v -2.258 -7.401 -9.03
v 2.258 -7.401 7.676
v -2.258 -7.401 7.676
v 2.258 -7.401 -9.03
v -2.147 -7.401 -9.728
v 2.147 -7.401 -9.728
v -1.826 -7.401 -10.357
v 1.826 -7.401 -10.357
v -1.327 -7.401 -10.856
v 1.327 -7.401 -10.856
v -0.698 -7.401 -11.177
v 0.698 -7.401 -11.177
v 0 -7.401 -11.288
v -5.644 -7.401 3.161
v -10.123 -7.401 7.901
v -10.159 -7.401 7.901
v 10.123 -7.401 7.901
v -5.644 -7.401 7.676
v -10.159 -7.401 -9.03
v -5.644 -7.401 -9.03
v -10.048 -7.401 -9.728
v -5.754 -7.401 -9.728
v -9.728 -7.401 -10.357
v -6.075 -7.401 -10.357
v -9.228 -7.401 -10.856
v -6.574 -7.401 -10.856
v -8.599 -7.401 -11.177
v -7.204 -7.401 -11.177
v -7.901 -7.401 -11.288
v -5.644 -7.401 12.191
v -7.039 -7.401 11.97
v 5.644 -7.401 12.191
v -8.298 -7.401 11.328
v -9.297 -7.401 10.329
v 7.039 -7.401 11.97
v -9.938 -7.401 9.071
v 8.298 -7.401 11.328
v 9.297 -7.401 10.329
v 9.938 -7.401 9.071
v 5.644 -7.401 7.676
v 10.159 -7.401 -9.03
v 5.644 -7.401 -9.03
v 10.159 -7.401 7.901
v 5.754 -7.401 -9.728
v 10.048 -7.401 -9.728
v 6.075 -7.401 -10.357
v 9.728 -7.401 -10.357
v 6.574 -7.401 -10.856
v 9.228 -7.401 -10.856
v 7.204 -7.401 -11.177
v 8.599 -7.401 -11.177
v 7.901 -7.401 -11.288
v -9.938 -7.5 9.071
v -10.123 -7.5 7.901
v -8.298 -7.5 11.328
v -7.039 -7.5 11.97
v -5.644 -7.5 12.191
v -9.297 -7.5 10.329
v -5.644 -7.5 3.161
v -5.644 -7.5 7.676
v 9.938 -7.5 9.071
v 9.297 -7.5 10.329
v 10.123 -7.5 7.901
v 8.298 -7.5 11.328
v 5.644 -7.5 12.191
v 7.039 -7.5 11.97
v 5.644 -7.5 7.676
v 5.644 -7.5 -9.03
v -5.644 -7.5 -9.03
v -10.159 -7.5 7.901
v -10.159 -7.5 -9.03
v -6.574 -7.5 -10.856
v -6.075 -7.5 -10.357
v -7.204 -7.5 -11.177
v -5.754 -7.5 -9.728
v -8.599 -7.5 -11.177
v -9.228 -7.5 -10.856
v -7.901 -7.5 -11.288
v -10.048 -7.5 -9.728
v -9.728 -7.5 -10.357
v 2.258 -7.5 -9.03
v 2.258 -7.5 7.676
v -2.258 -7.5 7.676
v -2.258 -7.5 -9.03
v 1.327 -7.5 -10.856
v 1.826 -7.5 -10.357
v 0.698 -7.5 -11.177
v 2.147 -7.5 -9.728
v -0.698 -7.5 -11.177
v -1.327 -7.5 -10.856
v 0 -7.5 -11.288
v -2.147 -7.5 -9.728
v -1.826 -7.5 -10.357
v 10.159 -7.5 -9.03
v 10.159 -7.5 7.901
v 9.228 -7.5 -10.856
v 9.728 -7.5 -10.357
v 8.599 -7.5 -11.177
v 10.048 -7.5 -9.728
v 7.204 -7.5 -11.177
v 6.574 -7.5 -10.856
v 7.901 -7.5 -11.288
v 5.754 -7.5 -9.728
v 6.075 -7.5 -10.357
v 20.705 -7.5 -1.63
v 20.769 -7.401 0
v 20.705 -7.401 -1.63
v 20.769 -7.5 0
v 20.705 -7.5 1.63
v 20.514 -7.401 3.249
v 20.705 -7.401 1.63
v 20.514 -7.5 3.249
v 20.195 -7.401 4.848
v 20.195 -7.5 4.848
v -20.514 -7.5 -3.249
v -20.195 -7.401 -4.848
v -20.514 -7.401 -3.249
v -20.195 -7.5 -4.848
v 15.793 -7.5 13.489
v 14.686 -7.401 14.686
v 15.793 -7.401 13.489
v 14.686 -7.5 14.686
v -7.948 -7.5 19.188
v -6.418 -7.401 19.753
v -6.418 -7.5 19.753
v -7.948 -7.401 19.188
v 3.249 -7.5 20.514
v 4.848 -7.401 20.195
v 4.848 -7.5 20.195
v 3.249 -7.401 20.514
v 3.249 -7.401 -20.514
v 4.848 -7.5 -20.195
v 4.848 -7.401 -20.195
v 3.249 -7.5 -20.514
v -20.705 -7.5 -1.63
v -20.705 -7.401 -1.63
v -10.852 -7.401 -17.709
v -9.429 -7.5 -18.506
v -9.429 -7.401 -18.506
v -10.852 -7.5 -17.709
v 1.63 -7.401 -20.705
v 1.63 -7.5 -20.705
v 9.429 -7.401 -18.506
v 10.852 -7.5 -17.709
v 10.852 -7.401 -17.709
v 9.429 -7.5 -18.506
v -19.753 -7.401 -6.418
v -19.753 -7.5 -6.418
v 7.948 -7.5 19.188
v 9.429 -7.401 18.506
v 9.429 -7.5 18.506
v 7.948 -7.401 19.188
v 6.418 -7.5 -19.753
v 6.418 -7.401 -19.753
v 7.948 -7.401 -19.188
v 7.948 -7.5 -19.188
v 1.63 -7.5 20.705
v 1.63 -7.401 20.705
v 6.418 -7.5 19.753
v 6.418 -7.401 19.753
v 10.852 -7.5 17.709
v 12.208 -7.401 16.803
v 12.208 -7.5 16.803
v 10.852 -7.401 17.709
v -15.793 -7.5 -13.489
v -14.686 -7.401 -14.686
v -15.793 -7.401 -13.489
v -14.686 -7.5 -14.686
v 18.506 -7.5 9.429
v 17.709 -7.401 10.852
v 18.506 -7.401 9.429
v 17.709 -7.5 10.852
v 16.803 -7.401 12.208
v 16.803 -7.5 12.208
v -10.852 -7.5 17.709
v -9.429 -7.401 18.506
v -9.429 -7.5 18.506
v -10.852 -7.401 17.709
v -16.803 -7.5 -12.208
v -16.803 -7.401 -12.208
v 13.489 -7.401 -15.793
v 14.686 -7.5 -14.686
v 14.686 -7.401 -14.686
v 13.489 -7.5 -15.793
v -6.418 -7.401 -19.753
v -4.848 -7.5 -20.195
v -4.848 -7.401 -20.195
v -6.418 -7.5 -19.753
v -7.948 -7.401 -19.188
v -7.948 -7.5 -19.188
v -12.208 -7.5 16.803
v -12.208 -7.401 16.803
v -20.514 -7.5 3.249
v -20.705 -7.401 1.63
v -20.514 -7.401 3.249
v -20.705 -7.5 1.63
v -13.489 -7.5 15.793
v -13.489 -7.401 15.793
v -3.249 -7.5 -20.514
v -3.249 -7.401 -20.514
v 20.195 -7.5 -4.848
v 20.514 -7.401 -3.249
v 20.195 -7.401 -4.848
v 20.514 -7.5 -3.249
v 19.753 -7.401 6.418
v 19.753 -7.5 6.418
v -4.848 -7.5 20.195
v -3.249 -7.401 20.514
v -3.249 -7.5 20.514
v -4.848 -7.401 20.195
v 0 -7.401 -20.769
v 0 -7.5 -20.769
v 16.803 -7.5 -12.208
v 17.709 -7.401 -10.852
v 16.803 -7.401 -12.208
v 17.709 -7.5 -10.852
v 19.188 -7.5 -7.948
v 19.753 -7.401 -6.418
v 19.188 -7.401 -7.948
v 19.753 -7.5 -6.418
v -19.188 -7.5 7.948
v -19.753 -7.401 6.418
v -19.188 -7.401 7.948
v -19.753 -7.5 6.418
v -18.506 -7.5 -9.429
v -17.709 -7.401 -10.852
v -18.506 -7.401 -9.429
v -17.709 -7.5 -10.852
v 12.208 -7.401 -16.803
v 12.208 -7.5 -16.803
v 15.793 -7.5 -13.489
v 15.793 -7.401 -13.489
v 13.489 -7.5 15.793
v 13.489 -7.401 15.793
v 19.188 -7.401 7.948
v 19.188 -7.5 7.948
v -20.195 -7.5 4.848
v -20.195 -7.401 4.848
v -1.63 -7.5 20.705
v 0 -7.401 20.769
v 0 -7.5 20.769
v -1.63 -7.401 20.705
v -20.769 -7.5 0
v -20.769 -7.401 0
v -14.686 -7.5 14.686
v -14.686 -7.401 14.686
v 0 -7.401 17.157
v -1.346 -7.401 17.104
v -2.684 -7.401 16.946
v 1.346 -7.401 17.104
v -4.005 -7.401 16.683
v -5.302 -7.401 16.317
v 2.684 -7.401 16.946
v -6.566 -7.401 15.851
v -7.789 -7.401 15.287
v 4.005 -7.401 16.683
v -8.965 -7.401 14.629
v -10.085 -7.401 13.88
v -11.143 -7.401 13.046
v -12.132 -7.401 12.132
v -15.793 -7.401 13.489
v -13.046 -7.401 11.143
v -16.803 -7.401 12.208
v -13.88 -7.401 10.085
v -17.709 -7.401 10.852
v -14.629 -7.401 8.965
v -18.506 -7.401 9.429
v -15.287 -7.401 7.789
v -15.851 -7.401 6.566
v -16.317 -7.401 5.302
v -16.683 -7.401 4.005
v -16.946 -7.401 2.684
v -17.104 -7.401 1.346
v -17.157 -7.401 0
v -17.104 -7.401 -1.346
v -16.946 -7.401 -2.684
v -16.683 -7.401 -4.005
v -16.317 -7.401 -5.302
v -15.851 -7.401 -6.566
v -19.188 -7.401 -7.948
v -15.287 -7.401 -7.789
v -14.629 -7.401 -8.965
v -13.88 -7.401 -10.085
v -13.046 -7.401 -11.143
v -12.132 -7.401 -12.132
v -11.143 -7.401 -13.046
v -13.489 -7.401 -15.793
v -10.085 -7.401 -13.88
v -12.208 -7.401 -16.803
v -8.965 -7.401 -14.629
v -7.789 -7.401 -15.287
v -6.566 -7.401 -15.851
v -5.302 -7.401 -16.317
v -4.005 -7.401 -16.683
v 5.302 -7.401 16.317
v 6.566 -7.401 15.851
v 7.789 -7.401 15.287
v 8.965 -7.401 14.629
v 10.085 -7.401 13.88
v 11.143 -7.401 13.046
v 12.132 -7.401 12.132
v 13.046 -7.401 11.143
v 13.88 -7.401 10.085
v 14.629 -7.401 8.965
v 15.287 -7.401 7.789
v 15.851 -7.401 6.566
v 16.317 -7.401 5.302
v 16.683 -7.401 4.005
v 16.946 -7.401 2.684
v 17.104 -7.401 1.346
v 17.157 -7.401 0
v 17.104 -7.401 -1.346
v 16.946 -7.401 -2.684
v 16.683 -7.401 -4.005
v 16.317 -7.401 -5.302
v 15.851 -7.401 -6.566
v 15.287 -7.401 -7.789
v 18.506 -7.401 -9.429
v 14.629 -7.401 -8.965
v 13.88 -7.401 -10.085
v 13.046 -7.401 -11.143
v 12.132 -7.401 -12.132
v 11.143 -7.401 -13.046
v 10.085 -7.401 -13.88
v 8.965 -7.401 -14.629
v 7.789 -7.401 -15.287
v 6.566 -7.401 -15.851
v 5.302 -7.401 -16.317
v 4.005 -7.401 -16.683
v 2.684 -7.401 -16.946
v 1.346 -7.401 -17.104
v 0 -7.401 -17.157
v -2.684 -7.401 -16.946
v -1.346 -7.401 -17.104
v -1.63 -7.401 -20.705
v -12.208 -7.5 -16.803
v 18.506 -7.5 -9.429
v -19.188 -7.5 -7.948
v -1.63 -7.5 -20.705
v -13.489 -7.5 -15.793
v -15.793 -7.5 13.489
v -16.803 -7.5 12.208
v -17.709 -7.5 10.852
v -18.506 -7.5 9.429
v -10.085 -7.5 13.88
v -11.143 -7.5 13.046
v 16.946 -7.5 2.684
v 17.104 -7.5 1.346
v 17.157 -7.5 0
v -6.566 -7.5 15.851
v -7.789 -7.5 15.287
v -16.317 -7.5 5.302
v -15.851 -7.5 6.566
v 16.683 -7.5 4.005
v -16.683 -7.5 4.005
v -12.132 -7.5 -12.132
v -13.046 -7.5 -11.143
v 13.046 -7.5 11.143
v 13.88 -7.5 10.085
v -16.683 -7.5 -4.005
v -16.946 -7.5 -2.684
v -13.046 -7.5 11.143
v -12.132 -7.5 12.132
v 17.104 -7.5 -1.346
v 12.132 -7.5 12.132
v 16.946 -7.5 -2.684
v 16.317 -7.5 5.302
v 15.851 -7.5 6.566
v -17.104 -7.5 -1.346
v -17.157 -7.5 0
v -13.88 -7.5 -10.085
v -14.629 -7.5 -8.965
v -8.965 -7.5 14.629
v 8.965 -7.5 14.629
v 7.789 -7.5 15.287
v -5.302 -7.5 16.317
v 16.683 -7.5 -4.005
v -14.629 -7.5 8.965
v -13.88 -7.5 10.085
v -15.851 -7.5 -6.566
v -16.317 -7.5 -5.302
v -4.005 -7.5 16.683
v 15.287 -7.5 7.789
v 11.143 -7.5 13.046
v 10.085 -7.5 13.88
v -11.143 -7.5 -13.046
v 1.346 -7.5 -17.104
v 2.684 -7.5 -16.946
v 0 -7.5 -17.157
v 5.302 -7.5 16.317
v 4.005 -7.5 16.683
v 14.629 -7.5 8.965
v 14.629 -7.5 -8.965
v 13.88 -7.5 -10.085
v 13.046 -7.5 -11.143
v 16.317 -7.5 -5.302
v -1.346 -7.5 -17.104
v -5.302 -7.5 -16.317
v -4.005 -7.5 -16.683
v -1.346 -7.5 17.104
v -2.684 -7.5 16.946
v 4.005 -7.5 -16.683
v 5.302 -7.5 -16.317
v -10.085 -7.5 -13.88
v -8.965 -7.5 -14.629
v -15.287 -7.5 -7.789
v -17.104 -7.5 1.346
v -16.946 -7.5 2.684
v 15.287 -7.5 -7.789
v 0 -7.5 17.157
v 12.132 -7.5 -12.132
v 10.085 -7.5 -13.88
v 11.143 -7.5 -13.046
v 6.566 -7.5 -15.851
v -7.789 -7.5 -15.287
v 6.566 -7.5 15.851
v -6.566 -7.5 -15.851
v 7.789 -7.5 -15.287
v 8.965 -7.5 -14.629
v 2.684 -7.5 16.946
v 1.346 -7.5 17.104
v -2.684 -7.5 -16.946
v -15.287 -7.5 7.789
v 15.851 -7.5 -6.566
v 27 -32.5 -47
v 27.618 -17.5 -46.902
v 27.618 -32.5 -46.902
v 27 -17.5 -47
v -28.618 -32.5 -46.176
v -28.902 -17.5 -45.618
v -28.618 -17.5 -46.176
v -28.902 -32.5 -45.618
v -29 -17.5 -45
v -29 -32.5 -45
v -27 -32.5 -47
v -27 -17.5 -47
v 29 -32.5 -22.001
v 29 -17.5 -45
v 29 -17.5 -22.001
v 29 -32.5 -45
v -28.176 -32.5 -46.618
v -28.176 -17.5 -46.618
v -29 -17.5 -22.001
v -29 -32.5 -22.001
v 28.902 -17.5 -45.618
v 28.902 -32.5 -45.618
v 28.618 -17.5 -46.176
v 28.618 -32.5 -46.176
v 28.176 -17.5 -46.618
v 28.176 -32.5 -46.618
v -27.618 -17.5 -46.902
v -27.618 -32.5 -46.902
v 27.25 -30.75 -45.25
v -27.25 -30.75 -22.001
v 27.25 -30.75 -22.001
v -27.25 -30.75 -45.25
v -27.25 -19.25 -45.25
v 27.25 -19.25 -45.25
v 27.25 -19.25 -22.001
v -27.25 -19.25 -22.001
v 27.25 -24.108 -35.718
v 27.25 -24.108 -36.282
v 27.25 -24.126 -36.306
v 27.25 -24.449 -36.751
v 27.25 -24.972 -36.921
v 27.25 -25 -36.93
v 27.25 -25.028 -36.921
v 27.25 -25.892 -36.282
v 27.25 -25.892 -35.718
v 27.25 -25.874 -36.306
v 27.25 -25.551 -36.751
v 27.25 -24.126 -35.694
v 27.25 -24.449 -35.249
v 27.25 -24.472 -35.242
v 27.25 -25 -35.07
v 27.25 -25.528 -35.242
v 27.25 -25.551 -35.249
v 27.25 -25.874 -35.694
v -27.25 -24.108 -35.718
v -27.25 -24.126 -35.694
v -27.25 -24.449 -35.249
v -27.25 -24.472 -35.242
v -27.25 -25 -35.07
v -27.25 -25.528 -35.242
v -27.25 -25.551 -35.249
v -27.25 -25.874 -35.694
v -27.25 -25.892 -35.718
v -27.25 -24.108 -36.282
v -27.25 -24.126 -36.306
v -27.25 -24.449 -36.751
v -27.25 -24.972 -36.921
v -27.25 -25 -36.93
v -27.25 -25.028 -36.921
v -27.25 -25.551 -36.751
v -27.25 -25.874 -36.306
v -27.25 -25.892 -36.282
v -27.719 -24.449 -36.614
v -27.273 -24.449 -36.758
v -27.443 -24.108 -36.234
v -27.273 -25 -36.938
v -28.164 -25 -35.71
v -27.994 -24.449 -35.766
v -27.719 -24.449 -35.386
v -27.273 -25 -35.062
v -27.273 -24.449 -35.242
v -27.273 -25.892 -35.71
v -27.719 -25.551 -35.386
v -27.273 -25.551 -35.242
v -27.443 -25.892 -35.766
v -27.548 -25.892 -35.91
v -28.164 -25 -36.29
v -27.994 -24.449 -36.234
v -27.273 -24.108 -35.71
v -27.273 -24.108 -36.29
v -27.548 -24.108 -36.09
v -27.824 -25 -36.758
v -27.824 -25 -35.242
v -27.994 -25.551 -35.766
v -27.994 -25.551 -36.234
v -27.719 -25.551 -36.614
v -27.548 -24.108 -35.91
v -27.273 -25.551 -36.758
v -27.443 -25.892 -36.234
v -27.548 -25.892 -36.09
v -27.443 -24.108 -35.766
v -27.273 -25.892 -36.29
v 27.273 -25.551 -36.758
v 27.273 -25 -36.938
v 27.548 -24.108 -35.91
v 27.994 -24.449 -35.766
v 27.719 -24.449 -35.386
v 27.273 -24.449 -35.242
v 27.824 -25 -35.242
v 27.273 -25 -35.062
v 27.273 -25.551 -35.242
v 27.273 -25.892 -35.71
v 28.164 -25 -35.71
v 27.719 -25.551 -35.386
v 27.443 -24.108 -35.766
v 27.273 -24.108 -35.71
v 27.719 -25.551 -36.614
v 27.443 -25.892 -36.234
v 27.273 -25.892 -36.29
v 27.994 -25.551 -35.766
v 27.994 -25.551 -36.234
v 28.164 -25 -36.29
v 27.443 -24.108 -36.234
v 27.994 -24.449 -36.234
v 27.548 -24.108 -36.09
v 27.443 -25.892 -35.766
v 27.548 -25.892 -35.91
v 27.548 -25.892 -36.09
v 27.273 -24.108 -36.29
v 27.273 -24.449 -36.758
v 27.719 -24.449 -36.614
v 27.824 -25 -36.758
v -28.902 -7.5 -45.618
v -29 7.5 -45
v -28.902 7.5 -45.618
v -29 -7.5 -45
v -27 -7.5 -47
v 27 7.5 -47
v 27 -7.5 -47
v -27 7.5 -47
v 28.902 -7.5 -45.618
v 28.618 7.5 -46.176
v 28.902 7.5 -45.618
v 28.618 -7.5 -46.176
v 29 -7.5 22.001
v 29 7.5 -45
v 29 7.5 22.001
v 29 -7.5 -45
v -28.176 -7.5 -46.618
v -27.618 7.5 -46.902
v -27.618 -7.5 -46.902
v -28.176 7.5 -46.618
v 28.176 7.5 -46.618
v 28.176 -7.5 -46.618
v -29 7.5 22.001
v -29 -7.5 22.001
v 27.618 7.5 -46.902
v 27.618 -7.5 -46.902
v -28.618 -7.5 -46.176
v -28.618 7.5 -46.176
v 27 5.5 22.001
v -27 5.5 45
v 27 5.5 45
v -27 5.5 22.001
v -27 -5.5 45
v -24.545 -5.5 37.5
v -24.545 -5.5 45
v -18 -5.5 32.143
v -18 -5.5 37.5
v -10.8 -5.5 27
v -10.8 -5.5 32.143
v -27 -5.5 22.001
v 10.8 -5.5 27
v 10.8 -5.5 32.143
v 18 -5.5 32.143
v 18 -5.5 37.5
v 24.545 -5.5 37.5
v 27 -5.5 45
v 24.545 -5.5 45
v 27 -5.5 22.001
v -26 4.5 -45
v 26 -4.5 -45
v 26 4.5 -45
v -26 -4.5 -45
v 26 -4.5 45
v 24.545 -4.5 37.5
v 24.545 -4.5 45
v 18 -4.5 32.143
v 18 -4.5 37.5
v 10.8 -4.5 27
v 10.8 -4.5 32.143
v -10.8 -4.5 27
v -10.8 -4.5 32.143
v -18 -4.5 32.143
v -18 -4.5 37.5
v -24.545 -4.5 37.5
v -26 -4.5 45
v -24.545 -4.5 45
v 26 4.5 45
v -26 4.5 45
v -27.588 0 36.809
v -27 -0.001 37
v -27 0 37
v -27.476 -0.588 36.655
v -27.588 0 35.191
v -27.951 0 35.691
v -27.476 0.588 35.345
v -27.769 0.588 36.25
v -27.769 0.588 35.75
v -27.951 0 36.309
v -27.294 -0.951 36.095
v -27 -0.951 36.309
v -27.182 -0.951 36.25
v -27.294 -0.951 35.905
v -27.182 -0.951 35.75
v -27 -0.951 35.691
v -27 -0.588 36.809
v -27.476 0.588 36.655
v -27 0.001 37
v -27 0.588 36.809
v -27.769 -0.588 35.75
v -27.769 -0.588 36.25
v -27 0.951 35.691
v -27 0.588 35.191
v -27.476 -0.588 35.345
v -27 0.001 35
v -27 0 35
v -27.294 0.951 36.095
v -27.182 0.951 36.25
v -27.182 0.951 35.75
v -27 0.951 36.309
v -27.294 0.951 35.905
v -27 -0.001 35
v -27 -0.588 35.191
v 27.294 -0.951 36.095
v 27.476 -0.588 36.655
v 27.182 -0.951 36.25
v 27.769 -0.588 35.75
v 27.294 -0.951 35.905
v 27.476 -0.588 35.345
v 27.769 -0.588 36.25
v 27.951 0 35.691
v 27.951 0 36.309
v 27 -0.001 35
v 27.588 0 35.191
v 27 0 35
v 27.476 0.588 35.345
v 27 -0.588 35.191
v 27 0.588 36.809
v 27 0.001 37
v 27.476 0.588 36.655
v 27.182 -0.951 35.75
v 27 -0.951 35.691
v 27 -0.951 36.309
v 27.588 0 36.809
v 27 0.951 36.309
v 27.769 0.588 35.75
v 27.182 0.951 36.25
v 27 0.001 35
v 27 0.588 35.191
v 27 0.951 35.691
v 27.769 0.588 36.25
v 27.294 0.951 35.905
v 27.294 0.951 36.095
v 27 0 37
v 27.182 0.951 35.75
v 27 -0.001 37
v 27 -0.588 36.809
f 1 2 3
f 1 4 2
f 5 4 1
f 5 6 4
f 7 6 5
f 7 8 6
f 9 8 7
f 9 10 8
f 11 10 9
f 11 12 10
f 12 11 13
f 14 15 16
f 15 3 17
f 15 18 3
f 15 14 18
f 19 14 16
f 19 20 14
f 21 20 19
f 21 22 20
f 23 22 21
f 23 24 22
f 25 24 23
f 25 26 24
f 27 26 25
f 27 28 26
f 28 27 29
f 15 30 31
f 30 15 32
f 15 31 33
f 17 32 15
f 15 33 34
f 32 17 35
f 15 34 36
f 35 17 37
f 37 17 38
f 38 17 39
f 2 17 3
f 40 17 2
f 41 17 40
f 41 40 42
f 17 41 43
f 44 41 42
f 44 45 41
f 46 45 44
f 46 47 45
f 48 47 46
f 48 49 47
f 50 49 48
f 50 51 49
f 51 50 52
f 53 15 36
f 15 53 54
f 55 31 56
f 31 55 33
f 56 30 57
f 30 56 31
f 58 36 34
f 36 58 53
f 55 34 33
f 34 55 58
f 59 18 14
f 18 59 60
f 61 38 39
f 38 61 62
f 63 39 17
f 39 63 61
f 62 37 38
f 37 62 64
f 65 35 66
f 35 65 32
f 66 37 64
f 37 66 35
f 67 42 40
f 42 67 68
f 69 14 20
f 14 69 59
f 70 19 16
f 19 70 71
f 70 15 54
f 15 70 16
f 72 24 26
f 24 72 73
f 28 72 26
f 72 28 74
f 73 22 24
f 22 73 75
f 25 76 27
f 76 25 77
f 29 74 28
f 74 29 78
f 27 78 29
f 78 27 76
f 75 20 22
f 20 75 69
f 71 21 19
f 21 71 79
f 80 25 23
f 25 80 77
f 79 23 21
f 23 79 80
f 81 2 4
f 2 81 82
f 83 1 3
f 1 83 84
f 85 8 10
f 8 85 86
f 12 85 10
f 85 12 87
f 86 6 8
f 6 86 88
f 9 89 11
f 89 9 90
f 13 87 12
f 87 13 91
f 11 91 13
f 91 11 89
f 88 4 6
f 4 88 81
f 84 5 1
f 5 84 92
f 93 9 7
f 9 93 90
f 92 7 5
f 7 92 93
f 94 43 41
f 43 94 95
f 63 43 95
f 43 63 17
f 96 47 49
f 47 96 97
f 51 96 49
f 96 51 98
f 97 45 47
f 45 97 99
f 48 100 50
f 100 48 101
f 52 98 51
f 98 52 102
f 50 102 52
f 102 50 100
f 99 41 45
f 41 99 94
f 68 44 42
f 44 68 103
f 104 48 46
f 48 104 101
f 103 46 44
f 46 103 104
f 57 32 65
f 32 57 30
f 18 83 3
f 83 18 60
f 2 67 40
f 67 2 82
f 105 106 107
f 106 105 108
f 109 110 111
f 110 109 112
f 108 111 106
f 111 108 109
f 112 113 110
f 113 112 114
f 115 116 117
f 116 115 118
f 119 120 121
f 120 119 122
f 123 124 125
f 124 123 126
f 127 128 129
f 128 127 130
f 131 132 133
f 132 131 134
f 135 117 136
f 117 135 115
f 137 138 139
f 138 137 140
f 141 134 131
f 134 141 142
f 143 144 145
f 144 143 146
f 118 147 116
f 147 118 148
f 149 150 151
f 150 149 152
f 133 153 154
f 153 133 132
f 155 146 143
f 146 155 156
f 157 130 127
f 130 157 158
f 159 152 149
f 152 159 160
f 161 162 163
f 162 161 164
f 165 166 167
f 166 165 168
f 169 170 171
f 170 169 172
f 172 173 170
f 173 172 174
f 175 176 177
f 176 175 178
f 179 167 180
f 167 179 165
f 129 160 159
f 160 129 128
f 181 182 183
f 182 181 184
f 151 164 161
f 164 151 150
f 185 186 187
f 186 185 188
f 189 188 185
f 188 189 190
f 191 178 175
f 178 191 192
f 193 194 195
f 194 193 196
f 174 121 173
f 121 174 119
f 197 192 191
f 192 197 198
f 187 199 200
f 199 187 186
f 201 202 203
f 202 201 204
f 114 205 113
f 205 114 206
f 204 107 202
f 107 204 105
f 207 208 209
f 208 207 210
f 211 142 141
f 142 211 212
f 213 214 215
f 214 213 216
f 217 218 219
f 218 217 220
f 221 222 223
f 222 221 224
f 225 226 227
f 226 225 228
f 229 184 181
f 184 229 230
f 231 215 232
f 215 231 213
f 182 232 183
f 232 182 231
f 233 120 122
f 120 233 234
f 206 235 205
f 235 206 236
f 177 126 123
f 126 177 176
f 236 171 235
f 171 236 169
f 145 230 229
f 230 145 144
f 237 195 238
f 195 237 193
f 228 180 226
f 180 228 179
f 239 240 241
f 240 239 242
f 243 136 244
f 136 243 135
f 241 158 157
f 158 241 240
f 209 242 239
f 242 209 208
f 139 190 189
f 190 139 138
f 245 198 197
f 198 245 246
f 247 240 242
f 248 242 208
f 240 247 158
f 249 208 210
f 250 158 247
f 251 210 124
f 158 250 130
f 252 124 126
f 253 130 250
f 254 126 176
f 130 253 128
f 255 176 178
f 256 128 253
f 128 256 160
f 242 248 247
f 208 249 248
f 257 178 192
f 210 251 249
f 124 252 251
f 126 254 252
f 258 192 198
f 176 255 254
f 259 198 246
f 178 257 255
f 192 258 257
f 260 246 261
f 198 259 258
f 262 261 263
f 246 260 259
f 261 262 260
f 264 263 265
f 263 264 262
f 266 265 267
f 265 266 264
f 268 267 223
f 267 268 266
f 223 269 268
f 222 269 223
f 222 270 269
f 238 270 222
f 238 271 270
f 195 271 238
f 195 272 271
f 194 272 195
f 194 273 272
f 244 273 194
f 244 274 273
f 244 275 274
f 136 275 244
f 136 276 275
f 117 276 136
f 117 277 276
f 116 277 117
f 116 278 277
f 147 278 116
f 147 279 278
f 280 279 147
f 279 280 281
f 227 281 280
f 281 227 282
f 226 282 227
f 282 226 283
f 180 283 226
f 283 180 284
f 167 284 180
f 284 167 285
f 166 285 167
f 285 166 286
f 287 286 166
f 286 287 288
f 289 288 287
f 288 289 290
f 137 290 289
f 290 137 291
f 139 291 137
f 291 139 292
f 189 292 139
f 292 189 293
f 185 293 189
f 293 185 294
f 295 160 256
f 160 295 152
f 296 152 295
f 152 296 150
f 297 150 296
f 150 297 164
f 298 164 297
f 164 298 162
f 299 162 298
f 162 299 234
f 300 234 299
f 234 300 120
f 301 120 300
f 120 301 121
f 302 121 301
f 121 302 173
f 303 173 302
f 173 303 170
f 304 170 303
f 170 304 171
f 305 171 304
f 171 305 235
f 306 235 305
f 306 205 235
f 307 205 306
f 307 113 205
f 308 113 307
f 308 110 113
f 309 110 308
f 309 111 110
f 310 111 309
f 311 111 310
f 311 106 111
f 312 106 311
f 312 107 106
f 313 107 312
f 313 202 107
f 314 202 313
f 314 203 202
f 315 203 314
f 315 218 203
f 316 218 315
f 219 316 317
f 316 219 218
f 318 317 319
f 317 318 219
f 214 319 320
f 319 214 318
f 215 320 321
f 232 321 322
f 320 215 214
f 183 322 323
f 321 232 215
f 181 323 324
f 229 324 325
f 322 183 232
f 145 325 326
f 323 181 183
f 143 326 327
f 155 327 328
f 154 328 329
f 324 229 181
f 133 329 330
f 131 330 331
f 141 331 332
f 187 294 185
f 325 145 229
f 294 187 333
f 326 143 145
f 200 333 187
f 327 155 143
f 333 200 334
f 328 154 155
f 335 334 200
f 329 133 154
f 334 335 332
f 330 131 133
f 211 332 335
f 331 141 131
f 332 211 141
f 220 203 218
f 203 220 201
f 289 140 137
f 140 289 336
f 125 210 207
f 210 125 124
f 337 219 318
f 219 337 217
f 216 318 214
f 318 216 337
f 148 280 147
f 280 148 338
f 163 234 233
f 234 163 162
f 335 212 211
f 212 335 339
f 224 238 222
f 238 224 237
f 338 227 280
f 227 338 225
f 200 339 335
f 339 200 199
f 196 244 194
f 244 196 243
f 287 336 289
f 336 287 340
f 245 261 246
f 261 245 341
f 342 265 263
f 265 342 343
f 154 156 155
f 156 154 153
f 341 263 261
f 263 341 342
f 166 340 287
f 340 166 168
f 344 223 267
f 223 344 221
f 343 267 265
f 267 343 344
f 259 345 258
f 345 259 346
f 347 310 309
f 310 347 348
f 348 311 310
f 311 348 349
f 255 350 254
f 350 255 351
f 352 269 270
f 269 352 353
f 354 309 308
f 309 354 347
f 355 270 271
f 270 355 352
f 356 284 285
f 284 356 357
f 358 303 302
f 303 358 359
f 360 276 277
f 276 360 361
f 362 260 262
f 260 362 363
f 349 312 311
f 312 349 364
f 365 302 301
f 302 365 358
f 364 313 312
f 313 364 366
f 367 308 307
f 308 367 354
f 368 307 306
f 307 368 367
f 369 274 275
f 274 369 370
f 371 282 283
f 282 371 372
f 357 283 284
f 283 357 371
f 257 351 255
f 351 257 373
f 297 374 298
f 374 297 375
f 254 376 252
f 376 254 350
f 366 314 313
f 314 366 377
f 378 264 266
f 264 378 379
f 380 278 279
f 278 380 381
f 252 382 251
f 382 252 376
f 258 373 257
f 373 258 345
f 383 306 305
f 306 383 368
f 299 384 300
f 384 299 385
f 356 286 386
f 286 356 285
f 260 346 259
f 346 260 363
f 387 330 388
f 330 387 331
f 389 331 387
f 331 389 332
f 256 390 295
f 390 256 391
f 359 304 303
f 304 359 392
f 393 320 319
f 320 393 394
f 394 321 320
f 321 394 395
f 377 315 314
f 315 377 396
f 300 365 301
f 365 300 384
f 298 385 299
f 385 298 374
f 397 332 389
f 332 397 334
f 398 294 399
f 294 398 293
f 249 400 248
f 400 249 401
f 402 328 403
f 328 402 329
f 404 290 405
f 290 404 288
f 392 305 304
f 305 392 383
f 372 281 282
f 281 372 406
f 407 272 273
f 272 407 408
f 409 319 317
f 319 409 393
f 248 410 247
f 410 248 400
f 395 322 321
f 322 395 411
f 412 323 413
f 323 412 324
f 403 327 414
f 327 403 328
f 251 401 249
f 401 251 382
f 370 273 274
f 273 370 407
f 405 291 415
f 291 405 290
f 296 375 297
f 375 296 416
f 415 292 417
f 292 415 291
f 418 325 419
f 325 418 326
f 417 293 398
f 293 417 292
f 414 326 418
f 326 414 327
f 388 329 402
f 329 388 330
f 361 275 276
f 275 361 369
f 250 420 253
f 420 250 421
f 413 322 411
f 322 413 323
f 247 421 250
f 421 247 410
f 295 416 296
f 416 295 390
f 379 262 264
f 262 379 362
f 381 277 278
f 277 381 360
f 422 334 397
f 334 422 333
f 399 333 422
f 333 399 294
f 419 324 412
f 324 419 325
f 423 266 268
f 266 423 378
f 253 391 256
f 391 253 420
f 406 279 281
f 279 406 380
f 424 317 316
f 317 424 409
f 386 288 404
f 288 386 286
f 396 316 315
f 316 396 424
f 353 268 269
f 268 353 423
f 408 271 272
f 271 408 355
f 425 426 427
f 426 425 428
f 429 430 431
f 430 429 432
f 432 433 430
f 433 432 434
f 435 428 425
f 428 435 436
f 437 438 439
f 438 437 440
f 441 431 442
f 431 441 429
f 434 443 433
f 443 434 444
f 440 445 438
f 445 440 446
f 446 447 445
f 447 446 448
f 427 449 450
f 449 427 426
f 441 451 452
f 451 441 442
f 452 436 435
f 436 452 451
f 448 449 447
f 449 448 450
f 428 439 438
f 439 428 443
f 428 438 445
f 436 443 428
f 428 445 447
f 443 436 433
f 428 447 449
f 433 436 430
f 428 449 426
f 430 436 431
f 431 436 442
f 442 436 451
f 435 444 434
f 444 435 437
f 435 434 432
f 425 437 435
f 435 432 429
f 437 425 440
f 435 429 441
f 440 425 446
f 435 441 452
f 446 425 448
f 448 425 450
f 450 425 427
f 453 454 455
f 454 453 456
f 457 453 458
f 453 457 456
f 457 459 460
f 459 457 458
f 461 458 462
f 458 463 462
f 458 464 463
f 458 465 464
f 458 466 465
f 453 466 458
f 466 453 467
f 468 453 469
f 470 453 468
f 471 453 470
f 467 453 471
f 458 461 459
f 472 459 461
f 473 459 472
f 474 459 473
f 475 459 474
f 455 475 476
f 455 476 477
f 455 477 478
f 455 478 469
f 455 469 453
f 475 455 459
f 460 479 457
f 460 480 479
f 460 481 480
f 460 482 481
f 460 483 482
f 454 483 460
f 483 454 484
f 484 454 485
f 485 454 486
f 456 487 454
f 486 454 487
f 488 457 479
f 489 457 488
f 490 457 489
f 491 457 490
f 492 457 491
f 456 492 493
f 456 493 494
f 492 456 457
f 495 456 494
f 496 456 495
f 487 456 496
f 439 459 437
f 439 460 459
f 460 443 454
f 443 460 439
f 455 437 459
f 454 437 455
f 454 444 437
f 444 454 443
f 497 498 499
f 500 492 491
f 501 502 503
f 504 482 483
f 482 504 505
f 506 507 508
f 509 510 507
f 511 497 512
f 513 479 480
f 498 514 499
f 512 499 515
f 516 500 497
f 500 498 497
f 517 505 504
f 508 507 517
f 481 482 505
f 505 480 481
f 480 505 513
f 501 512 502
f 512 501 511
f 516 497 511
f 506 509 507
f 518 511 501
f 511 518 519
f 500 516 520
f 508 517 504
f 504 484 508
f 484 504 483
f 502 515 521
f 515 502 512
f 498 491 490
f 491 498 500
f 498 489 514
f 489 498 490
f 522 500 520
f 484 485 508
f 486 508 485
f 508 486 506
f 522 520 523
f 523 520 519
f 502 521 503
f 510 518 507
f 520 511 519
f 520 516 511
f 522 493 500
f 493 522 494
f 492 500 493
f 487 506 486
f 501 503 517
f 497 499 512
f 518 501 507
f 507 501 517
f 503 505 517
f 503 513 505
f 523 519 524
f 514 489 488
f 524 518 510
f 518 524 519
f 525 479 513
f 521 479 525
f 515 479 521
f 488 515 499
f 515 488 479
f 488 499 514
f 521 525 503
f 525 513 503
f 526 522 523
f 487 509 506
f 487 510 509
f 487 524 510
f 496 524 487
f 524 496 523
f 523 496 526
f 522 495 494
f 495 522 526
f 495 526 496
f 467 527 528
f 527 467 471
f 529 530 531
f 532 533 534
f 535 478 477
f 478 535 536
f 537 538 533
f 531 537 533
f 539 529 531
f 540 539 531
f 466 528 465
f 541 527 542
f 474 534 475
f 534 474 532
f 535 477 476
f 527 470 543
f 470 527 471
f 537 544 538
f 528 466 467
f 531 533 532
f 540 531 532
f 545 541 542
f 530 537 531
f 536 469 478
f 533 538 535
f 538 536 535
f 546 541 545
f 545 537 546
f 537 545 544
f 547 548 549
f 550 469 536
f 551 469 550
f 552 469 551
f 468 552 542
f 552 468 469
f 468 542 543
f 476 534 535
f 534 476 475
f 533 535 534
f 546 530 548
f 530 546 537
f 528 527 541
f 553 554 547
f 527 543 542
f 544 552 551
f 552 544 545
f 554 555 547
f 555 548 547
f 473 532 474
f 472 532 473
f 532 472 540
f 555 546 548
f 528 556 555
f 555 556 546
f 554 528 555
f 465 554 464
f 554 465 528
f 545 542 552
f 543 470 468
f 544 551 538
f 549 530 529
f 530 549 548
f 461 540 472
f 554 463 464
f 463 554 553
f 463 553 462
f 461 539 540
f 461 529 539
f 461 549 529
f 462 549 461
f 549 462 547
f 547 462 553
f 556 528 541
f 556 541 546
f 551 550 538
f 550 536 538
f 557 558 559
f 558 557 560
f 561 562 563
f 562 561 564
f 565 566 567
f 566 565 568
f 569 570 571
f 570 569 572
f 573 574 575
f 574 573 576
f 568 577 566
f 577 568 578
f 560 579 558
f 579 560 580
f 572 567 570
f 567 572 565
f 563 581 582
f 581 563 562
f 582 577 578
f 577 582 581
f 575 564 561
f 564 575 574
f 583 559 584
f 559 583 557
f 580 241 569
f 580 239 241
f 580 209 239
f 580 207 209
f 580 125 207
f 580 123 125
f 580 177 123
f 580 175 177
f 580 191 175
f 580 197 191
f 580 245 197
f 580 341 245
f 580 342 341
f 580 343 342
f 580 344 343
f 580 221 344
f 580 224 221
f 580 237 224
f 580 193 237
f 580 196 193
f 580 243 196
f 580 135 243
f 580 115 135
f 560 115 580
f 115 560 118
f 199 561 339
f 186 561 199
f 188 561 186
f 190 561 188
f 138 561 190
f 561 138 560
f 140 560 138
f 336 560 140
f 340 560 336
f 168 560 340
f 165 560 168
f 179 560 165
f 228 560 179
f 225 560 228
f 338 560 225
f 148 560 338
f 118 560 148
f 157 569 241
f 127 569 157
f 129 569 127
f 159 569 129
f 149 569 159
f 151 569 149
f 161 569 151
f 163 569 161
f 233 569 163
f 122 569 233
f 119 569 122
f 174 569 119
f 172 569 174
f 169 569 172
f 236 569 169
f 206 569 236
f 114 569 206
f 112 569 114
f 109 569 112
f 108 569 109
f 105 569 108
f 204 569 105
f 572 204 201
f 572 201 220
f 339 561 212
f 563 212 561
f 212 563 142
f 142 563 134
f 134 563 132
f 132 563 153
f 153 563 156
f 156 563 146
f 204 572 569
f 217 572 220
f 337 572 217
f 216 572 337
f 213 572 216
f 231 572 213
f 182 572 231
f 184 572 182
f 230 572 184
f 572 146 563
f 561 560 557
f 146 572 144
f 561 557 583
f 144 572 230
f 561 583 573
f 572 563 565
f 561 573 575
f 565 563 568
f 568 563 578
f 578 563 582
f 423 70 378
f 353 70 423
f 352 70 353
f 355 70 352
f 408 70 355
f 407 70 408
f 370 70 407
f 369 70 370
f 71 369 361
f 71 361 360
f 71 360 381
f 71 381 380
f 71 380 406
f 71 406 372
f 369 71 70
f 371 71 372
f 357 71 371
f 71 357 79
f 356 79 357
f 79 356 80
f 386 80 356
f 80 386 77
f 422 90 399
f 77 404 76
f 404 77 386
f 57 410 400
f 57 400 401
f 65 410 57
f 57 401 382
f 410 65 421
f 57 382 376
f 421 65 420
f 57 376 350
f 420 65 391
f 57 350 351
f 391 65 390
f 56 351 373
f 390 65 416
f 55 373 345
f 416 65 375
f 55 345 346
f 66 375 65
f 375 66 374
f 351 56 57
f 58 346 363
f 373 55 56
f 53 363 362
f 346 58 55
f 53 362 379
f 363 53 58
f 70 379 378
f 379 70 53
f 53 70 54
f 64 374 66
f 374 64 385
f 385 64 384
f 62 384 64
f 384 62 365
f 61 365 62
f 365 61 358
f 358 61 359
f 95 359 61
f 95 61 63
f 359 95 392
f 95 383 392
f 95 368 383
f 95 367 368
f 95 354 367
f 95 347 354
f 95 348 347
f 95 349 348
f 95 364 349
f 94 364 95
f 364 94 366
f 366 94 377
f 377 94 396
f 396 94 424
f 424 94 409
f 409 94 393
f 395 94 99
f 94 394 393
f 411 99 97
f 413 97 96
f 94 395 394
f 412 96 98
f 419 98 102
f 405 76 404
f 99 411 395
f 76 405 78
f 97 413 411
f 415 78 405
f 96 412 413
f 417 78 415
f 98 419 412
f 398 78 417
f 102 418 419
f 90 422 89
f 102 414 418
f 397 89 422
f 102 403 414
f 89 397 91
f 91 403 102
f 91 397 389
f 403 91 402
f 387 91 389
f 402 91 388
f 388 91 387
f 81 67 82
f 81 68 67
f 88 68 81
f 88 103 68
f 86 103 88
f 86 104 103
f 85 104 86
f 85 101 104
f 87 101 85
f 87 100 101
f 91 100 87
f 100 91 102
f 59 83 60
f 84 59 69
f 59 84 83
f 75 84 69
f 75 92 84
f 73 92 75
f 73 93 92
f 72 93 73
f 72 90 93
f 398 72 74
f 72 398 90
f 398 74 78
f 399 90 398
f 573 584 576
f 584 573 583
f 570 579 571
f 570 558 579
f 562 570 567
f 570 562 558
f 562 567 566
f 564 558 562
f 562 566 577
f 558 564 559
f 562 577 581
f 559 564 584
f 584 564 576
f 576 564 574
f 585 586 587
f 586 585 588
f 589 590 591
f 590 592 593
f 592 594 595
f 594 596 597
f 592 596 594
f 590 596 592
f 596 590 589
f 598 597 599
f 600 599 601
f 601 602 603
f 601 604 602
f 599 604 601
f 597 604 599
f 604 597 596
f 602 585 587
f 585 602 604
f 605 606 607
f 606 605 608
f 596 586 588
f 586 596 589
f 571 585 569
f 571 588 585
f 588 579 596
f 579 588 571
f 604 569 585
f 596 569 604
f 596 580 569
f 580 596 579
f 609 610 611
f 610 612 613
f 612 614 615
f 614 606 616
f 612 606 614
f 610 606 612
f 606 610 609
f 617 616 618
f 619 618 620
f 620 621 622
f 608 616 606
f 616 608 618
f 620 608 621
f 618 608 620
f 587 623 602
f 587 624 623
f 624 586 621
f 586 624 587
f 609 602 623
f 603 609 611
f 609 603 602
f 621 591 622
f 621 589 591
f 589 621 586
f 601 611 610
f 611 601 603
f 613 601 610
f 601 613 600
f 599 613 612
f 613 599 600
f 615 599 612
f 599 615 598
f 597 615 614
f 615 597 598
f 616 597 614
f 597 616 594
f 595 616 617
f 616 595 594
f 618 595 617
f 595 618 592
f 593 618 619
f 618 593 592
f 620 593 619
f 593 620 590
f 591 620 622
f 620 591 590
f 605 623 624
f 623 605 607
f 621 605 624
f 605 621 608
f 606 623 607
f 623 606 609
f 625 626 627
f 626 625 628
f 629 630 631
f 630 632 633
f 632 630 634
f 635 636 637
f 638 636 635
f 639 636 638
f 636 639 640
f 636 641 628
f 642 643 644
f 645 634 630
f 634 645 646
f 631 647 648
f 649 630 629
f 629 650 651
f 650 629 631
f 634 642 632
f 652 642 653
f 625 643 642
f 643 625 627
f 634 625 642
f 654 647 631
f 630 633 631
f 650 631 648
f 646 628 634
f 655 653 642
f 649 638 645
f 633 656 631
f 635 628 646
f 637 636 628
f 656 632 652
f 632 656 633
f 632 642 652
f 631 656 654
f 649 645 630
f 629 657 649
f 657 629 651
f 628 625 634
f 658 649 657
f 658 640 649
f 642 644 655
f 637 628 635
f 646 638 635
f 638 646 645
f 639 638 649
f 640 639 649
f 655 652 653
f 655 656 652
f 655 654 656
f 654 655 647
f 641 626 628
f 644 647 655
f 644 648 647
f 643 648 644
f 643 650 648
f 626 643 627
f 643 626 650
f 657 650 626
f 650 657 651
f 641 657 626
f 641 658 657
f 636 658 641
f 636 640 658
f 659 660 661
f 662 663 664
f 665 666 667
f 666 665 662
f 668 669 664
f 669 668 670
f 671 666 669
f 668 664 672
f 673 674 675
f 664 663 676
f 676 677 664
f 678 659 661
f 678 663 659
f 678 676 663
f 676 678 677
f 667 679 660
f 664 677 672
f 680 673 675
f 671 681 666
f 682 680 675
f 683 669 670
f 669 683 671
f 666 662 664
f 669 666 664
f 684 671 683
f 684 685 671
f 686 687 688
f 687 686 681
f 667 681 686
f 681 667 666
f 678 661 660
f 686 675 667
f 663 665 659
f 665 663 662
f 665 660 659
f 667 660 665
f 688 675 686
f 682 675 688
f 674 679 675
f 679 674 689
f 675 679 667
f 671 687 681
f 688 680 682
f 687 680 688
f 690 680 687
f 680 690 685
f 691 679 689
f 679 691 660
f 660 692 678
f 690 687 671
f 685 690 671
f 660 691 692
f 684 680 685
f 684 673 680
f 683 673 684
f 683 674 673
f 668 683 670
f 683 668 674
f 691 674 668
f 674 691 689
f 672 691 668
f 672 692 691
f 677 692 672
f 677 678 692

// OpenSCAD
/* [Global] */

/* [Card] */
//How many cards would you like to hold?
card_number = 15;
//How long is your card?
card_length = 89.22;
//How wide is your card?
card_width = 51.1;
//How thick is your card?
card_thickness = .5;

/* [Box] */
wall_thickness = 2; //[2:1:10]
corner_style = "Rounded"; //[Rounded,Angled,None]

/* [Logo] */
logo_style = "MakerBot Logo"; //[MakerBot Logo,Heart,Star,Draw Your Own,None]
logo_size = 20; //[1:1:50]
logo_depth = .1; //[.1:.1:1]

/* [Star] */
//This will only affect the "Star" logo style.
star_border_thickness = 15; //[0:1:50]

/* [Draw] */
//Draw your own logo using the canvas below. WARNING: This feature is experimental, and may be a big buggy!
draw_a_logo =  [[[-30.607849,-48.473831],[-38.714745,-48.950043],[-40.559818,-48.486679],[-42.201851,-47.493645],[-47.306175,-42.282654],[-50.067959,-38.508476],[-47.496841,-39.749046],[-46.892071,-39.806171],[-46.653542,-39.556297],[-49.260830,-36.213120],[-49.681732,-34.902710],[-49.585598,-33.782043],[-49.138451,-33.165283],[-48.672112,-33.207165],[-46.200596,-35.658916],[-47.279457,-33.120216],[-47.321926,-32.230251],[-46.990898,-31.375122],[-45.878410,-30.094749],[-43.224831,-28.013985],[-42.217957,-27.615326],[-41.118553,-27.667067],[-40.805717,-27.398746],[-40.440659,-25.661360],[-39.173859,-13.378041],[-37.786060,-6.545761],[-36.585690,-3.203835],[-34.921036,-0.177278],[-32.697136,2.334522],[-31.352158,3.341671],[-28.276741,4.879042],[-24.862782,5.878342],[-21.320715,6.457005],[-16.227745,6.793123],[-6.193724,6.651176],[-3.917368,6.182596],[1.149520,4.628635],[3.496422,4.354591],[5.367534,4.861082],[8.187830,6.665401],[10.588829,7.390333],[11.411912,7.954811],[11.835903,9.095350],[12.399237,12.947439],[13.889902,16.162262],[13.933737,17.683546],[13.316607,19.065596],[11.898010,21.208532],[6.859921,27.302176],[5.617778,29.462534],[5.115950,31.361303],[3.388903,42.964180],[3.273381,46.066513],[3.726890,48.114418],[4.978456,49.315399],[7.242655,49.967201],[8.609360,50.079552],[9.707384,49.859634],[11.739238,48.611275],[14.175842,46.044868],[16.663437,42.226387],[17.125431,47.022690],[17.457367,48.010414],[17.989151,48.348061],[19.181324,47.905319],[24.528868,44.299988],[25.586594,43.349907],[26.602041,41.795021],[27.508392,39.332878],[29.795576,26.542974],[30.282230,24.476656],[31.117352,22.414083],[31.720629,21.625368],[32.642006,21.057058],[35.131134,20.683912],[36.914520,20.059973],[39.043831,18.184668],[42.450657,14.071085],[46.617176,8.405781],[48.564854,5.175398],[49.817593,2.084951],[50.067959,0.425432],[49.656380,-0.983798],[48.150597,-2.837172],[45.817619,-4.786176],[42.303886,-6.914544],[36.506889,-8.046309],[35.342590,-8.523187],[34.626579,-9.248261],[34.336266,-10.490269],[34.565552,-12.031119],[35.052368,-13.404231],[37.089733,-17.042198],[37.317879,-18.115067],[37.155357,-19.071182],[35.604301,-21.320902],[33.913990,-23.043991],[33.883816,-28.314064],[33.082306,-30.108660],[31.550901,-32.176041],[30.204401,-33.504837],[26.342428,-35.397213],[25.570063,-36.226906],[25.784672,-37.377975],[26.657942,-38.691196],[35.016315,-47.244415],[36.307613,-48.865204],[36.517559,-49.673759],[35.642605,-50.079552],[30.526541,-50.070801],[27.432796,-49.786285],[24.770382,-49.194931],[21.059244,-47.649162],[13.547039,-43.090836],[12.276370,-42.541962],[10.688703,-42.258522],[3.786492,-43.914528],[2.470330,-44.603432],[2.196272,-45.124454],[2.270218,-46.117500],[3.513528,-49.225983],[3.376098,-49.617065],[2.794866,-49.836327],[-5.766325,-50.020004],[-18.879635,-49.768524],[-25.214447,-49.130280],[-29.151905,-47.714996],[-30.600498,-48.472359]],[[0,1,2,3,4,5,6,7,8,9,10,11,12,13,14,15,16,17,18,19,20,21,22,23,24,25,26,27,28,29,30,31,32,33,34,35,36,37,38,39,40,41,42,43,44,45,46,47,48,49,50,51,52,53,54,55,56,57,58,59,60,61,62,63,64,65,66,67,68,69,70,71,72,73,74,75,76,77,78,79,80,81,82,83,84,85,86,87,88,89,90,91,92,93,94,95,96,97,98,99,100,101,102,103,104,105,106,107,108,109,110,111,112,113,114,115,116,117,118,119,120,121,122,123,124,125,126,127]]]; //[draw_polygon:100x100]

/* [Hidden] */

//The thickness of the border around the inside of the box which locks into the top piece.
border_thickness = wall_thickness/2; //[1:1:5]


/* [Upload] */ //IF YOU PUT THIS BACK IN, REMEMBER TO ADD IT TO LOGO_STYLE
// Upload a 100x100 pixel image (images will be automatically stretched to fit). Simple, high contrast images like logos work best.
//upload_image = "testimage_invert.dat"; // [image_surface:100x100]

inner_length = ceil(card_length); //Card is 89.22mm
inner_width = ceil(card_width) + (border_thickness * 2); //Card is 51.10mm
inner_height = ((card_thickness * 1.2) * card_number) + (border_thickness * 2); //Card is .5mm
frontcut1_length = inner_length / 6;
frontcut1_width = inner_width / 1.1;
frontcut2_length = inner_length / 3.5;
frontcut2_width = inner_width / 1.5;
frontcut3_length = inner_length / 2.5;
frontcut3_width = inner_width / 2.5;
top_height = (inner_length + wall_thickness) / 4;
top_fit = 4;
logo_xy = logo_size * (inner_width / 26);
MBM_height = 60;
MBM_thickness = 1;
MBM_radius = MBM_height/5.5;
function lookup_rez(wall_thickness) = floor(lookup(wall_thickness,[[2,10],[10,20]]));
e = .001; //epsilon

rotate([90,90,0]){
    TopFinal();
    BottomFinal();
}

/* Modules */

module TopFinal(){
    translate([0,0,(inner_height + (wall_thickness * 2)) + 10]){
        rotate([0,180,0]){
            difference(){
                TopLocked();
                translate([0,0,((inner_height/2) + wall_thickness + (wall_thickness/4)) - logo_depth + e]){
                    if(logo_style == "MakerBot Logo"){
                        MakerbotLogo();
                    }
                    if(logo_style == "Heart"){
                        HeartLogo();
                    }
                    if(logo_style == "Star"){
                        StarLogo();
                    }
                    if(logo_style == "Upload An Image"){
                        UploadedLogo();
                    }
                    if(logo_style == "Draw Your Own"){
                        DrawnLogo();
                    }
                }
            }
        }
    }
}
module BottomFinal(){
    difference(){
        BottomLocked();
        translate([0,0,((inner_height/2) + wall_thickness + (wall_thickness/4)) - logo_depth + e]){
            if(logo_style == "MakerBot Logo"){
                MakerbotLogo();
            }
            if(logo_style == "Heart"){
                HeartLogo();
            }
            if(logo_style == "Star"){
                StarLogo();
            }
            if(logo_style == "Upload An Image"){
                UploadedLogo();
            }
            if(logo_style == "Draw Your Own"){
                DrawnLogo();
            }
        }
    }
}
module HeartLogo(){
    resize([logo_xy,logo_xy,wall_thickness/2]){
        translate([1.5,0,0]){
            rotate([0,0,135]){
                linear_extrude(height = 1, center = true){
                    square([20,20], center = true);
                    translate([0, 10, 0]){
                        circle(r = 10);
                    }
                    translate([10, 0, 0]){
                        circle(r = 10);
                    }
                }
            }
        }
    }
}
module DrawnLogo(){
    scale([logo_xy/100,logo_xy/100,wall_thickness/2]){
        rotate([0,0,90]){
            linear_extrude(height = 1, center = true){
                polygon(points = draw_a_logo[0], paths = draw_a_logo[1], center = true);
            }
        }
    }
}
//module UploadedLogo(){
//    resize([logo_xy,logo_xy,wall_thickness/2]){
//        translate([0,0,-.25]){
//            difference(){
//                surface(file = upload_image, center = true);
//                translate([0,0,-.5]){
//                    cube([100,100,1],center = true);
//                }
//            }
//        }
//    }
//}
module StarLogo(){
    resize([logo_xy,logo_xy,wall_thickness/2]){
        difference(){
            cylinder($fn = 3, r = 50, h = 1, center = true);
            cylinder($fn = 3, r = 50 - star_border_thickness, h = 1, center = true);
        }
        rotate([0,0,180]){
            difference(){
                cylinder($fn = 3, r = 50, h = 1, center = true);
                cylinder($fn = 3, r = 50 - star_border_thickness, h = 1, center = true);
            }
        }
    }
}
module MakerbotLogo(){
	resize([logo_xy,logo_xy,wall_thickness/2]){
        rotate([0,0,90]){
            translate([-1.25*MBM_radius,1.5*MBM_radius,-MBM_thickness/2]){
                translate([0,MBM_radius * 0.2,]){
                    difference(){
                        cylinder(r=MBM_radius,h = MBM_thickness, $fn=20);
                        translate([0,-1*MBM_radius,0]){
                            cube([MBM_radius,MBM_radius,MBM_thickness]);
                        }
                    }
                }
                translate([2.5*MBM_radius,MBM_radius * 0.2,0]){
                    difference(){
                        cylinder(r=MBM_radius,h = MBM_thickness, $fn=20);
                        translate([-1*MBM_radius,-1*MBM_radius,0]){
                            cube([MBM_radius,MBM_radius,MBM_thickness]);
                        }
                    }
                }
                translate([-1*MBM_radius,0,0]){
                    translate([0,-3.5*MBM_radius,0]){
                        cube([MBM_radius,3.75*MBM_radius,MBM_thickness]);
                    }
                    translate([MBM_radius/2,-3.5*MBM_radius,0]){
                        cylinder(r=MBM_radius/2,h=MBM_thickness, $fn=20);
                    }
                }
                translate([0.75*MBM_radius,0,0]){
                    translate([0,-3.5*MBM_radius,0]){
                        cube([MBM_radius,3.75*MBM_radius,MBM_thickness]);
                    }
                    translate([MBM_radius/2,-3.5*MBM_radius,0]){
                        cylinder(r=MBM_radius/2,h=MBM_thickness, $fn=20);
                    }
                }
                translate([2.5*MBM_radius,0,0]){
                    translate([0,-3.5*MBM_radius,0]){
                        cube([MBM_radius,3.75*MBM_radius,MBM_thickness]);
                    }
                    translate([MBM_radius/2,-3.5*MBM_radius,0]){
                        cylinder(r=MBM_radius/2,h=MBM_thickness, $fn=20);
                    }
                }
                translate([0,MBM_radius * 0.2,0]){
                    cube([2.5*MBM_radius,MBM_radius,MBM_thickness]);
                }
            }
            difference(){
                cylinder(r = MBM_radius * 4.6, h = MBM_thickness, center = true, $fn = 80);
                cylinder(r = MBM_radius * 3.8, h = MBM_thickness + e, center = true, $fn = 80);
            }
        }
    }
}
module BottomLocked(){
    BottomRaw();
    translate([-inner_length/2.5,-inner_width/2,0]){
        difference(){
            sphere($fn = lookup_rez(wall_thickness), r = wall_thickness/2);
            translate([0,wall_thickness/2,0]){
                cube([wall_thickness + e,wall_thickness + e,wall_thickness + e], center = true);
            }
        }
    }
    translate([-inner_length/2.5,inner_width/2,0]){
        difference(){
            sphere($fn = lookup_rez(wall_thickness), r = wall_thickness/2);
            translate([0,-wall_thickness/2,0]){
                cube([wall_thickness + e,wall_thickness + e,wall_thickness + e], center = true);
            }
        }
    }
}
module TopLocked(){
    difference(){
        TopRaw();
        union(){
            translate([-inner_length/2.5,-inner_width/1.98,0]){
//                if((border_thickness - wall_thickness) >= 3){
//                    sphere($fn = 20, r = inner_height/8 - ((border_thickness - wall_thickness)/3));
//                } else {
//                    sphere($fn = 20, r = inner_height/8);
//                }
                sphere($fn = lookup_rez(wall_thickness), r = inner_height/16 - ((border_thickness - wall_thickness)/4));
            }
            translate([-inner_length/2.5,inner_width/1.98,0]){
//                if((border_thickness - wall_thickness) >= 3){
//                    sphere($fn = 20, r = inner_height/8 - ((border_thickness - wall_thickness)/3));
//                } else {
//                    sphere($fn = 20, r = inner_height/8);
//                }
                sphere($fn = lookup_rez(wall_thickness), r = inner_height/16 - ((border_thickness - wall_thickness)/4));
            }
        }
    }
}
module Border(){
    //Front secton, stepped
    translate([0,0,(inner_height/2) - (border_thickness/2)]){
        linear_extrude(height = border_thickness, center = true){
            difference(){
                square([inner_length,inner_width], center = true);
                translate([-inner_length/2,0,0]){
                    square([frontcut1_length,frontcut1_width], center = true);
                }
                translate([-inner_length/2,0,0]){
                    square([frontcut2_length,frontcut2_width], center = true);
                }
                translate([-inner_length/2,0,0]){
                    square([frontcut3_length,frontcut3_width], center = true);
                }
            }
        }
    }
    //Back section
    translate([0,0,-(inner_height/2) + (border_thickness/2)]){
        linear_extrude(height = border_thickness, center = true){
            square([inner_length,inner_width], center = true);
        }
    }
    //Left section
    translate([0,-(inner_width/2) + (border_thickness/2),0]){
        rotate([90,0,0]){
            linear_extrude(height = border_thickness, center = true){
                square([inner_length,inner_height], center = true);
            }
        }
    }
    //Right section
    translate([0,(inner_width/2) - (border_thickness/2),0]){
        rotate([90,0,0]){
            linear_extrude(height = border_thickness, center = true){
                square([inner_length,inner_height], center = true);
            }
        }
    }
}

module BottomRaw(){
    intersection(){
        difference(){
            linear_extrude(height = inner_height + (wall_thickness * 2), center = true){
                if(corner_style == "Rounded"){
                    offset($fn = 20, r = wall_thickness){
                        square([inner_length,inner_width], center = true);
                    }
                }
                if(corner_style == "Angled"){
                    offset($fn = 20, delta = wall_thickness, chamfer = true){
                        square([inner_length,inner_width], center = true);
                    }
                }
                if(corner_style == "None"){
                    offset($fn = 20, delta = wall_thickness){
                        square([inner_length,inner_width], center = true);
                    }
                }
            }
            InnerBoxFull();
        }
        translate([top_height,0,0]){
            cube([inner_length + (e * 2),inner_width + (wall_thickness * 2) + (e * 2),inner_height + (wall_thickness * 2) + (e * 2)], center = true);
        }
    }
    Border();
}
module TopRaw(){
    difference(){
        difference(){
            linear_extrude(height = inner_height + (wall_thickness * 2), center = true){
                if(corner_style == "Rounded"){
                    offset($fn = 20, r = wall_thickness){
                        square([inner_length,inner_width], center = true);
                    }
                }
                if(corner_style == "Angled"){
                    offset($fn = 20, delta = wall_thickness, chamfer = true){
                        square([inner_length,inner_width], center = true);
                    }
                }
                if(corner_style == "None"){
                    offset($fn = 20, delta = wall_thickness){
                        square([inner_length,inner_width], center = true);
                    }
                }
            }
            resize([inner_length + (wall_thickness / top_fit),inner_width + (wall_thickness / top_fit),inner_height + (wall_thickness / top_fit)]){
                InnerBoxFull();
            }
        }
        translate([top_height,0,0]){
            cube([inner_length + (e * 2),inner_width + (wall_thickness * 2) + (e * 2),inner_height + (wall_thickness * 2) + (e * 2)], center = true);
        }
    }
}
module InnerBoxFull(){
    linear_extrude(height = inner_height, center = true){
        square([inner_length,inner_width], center = true);
    }
}
